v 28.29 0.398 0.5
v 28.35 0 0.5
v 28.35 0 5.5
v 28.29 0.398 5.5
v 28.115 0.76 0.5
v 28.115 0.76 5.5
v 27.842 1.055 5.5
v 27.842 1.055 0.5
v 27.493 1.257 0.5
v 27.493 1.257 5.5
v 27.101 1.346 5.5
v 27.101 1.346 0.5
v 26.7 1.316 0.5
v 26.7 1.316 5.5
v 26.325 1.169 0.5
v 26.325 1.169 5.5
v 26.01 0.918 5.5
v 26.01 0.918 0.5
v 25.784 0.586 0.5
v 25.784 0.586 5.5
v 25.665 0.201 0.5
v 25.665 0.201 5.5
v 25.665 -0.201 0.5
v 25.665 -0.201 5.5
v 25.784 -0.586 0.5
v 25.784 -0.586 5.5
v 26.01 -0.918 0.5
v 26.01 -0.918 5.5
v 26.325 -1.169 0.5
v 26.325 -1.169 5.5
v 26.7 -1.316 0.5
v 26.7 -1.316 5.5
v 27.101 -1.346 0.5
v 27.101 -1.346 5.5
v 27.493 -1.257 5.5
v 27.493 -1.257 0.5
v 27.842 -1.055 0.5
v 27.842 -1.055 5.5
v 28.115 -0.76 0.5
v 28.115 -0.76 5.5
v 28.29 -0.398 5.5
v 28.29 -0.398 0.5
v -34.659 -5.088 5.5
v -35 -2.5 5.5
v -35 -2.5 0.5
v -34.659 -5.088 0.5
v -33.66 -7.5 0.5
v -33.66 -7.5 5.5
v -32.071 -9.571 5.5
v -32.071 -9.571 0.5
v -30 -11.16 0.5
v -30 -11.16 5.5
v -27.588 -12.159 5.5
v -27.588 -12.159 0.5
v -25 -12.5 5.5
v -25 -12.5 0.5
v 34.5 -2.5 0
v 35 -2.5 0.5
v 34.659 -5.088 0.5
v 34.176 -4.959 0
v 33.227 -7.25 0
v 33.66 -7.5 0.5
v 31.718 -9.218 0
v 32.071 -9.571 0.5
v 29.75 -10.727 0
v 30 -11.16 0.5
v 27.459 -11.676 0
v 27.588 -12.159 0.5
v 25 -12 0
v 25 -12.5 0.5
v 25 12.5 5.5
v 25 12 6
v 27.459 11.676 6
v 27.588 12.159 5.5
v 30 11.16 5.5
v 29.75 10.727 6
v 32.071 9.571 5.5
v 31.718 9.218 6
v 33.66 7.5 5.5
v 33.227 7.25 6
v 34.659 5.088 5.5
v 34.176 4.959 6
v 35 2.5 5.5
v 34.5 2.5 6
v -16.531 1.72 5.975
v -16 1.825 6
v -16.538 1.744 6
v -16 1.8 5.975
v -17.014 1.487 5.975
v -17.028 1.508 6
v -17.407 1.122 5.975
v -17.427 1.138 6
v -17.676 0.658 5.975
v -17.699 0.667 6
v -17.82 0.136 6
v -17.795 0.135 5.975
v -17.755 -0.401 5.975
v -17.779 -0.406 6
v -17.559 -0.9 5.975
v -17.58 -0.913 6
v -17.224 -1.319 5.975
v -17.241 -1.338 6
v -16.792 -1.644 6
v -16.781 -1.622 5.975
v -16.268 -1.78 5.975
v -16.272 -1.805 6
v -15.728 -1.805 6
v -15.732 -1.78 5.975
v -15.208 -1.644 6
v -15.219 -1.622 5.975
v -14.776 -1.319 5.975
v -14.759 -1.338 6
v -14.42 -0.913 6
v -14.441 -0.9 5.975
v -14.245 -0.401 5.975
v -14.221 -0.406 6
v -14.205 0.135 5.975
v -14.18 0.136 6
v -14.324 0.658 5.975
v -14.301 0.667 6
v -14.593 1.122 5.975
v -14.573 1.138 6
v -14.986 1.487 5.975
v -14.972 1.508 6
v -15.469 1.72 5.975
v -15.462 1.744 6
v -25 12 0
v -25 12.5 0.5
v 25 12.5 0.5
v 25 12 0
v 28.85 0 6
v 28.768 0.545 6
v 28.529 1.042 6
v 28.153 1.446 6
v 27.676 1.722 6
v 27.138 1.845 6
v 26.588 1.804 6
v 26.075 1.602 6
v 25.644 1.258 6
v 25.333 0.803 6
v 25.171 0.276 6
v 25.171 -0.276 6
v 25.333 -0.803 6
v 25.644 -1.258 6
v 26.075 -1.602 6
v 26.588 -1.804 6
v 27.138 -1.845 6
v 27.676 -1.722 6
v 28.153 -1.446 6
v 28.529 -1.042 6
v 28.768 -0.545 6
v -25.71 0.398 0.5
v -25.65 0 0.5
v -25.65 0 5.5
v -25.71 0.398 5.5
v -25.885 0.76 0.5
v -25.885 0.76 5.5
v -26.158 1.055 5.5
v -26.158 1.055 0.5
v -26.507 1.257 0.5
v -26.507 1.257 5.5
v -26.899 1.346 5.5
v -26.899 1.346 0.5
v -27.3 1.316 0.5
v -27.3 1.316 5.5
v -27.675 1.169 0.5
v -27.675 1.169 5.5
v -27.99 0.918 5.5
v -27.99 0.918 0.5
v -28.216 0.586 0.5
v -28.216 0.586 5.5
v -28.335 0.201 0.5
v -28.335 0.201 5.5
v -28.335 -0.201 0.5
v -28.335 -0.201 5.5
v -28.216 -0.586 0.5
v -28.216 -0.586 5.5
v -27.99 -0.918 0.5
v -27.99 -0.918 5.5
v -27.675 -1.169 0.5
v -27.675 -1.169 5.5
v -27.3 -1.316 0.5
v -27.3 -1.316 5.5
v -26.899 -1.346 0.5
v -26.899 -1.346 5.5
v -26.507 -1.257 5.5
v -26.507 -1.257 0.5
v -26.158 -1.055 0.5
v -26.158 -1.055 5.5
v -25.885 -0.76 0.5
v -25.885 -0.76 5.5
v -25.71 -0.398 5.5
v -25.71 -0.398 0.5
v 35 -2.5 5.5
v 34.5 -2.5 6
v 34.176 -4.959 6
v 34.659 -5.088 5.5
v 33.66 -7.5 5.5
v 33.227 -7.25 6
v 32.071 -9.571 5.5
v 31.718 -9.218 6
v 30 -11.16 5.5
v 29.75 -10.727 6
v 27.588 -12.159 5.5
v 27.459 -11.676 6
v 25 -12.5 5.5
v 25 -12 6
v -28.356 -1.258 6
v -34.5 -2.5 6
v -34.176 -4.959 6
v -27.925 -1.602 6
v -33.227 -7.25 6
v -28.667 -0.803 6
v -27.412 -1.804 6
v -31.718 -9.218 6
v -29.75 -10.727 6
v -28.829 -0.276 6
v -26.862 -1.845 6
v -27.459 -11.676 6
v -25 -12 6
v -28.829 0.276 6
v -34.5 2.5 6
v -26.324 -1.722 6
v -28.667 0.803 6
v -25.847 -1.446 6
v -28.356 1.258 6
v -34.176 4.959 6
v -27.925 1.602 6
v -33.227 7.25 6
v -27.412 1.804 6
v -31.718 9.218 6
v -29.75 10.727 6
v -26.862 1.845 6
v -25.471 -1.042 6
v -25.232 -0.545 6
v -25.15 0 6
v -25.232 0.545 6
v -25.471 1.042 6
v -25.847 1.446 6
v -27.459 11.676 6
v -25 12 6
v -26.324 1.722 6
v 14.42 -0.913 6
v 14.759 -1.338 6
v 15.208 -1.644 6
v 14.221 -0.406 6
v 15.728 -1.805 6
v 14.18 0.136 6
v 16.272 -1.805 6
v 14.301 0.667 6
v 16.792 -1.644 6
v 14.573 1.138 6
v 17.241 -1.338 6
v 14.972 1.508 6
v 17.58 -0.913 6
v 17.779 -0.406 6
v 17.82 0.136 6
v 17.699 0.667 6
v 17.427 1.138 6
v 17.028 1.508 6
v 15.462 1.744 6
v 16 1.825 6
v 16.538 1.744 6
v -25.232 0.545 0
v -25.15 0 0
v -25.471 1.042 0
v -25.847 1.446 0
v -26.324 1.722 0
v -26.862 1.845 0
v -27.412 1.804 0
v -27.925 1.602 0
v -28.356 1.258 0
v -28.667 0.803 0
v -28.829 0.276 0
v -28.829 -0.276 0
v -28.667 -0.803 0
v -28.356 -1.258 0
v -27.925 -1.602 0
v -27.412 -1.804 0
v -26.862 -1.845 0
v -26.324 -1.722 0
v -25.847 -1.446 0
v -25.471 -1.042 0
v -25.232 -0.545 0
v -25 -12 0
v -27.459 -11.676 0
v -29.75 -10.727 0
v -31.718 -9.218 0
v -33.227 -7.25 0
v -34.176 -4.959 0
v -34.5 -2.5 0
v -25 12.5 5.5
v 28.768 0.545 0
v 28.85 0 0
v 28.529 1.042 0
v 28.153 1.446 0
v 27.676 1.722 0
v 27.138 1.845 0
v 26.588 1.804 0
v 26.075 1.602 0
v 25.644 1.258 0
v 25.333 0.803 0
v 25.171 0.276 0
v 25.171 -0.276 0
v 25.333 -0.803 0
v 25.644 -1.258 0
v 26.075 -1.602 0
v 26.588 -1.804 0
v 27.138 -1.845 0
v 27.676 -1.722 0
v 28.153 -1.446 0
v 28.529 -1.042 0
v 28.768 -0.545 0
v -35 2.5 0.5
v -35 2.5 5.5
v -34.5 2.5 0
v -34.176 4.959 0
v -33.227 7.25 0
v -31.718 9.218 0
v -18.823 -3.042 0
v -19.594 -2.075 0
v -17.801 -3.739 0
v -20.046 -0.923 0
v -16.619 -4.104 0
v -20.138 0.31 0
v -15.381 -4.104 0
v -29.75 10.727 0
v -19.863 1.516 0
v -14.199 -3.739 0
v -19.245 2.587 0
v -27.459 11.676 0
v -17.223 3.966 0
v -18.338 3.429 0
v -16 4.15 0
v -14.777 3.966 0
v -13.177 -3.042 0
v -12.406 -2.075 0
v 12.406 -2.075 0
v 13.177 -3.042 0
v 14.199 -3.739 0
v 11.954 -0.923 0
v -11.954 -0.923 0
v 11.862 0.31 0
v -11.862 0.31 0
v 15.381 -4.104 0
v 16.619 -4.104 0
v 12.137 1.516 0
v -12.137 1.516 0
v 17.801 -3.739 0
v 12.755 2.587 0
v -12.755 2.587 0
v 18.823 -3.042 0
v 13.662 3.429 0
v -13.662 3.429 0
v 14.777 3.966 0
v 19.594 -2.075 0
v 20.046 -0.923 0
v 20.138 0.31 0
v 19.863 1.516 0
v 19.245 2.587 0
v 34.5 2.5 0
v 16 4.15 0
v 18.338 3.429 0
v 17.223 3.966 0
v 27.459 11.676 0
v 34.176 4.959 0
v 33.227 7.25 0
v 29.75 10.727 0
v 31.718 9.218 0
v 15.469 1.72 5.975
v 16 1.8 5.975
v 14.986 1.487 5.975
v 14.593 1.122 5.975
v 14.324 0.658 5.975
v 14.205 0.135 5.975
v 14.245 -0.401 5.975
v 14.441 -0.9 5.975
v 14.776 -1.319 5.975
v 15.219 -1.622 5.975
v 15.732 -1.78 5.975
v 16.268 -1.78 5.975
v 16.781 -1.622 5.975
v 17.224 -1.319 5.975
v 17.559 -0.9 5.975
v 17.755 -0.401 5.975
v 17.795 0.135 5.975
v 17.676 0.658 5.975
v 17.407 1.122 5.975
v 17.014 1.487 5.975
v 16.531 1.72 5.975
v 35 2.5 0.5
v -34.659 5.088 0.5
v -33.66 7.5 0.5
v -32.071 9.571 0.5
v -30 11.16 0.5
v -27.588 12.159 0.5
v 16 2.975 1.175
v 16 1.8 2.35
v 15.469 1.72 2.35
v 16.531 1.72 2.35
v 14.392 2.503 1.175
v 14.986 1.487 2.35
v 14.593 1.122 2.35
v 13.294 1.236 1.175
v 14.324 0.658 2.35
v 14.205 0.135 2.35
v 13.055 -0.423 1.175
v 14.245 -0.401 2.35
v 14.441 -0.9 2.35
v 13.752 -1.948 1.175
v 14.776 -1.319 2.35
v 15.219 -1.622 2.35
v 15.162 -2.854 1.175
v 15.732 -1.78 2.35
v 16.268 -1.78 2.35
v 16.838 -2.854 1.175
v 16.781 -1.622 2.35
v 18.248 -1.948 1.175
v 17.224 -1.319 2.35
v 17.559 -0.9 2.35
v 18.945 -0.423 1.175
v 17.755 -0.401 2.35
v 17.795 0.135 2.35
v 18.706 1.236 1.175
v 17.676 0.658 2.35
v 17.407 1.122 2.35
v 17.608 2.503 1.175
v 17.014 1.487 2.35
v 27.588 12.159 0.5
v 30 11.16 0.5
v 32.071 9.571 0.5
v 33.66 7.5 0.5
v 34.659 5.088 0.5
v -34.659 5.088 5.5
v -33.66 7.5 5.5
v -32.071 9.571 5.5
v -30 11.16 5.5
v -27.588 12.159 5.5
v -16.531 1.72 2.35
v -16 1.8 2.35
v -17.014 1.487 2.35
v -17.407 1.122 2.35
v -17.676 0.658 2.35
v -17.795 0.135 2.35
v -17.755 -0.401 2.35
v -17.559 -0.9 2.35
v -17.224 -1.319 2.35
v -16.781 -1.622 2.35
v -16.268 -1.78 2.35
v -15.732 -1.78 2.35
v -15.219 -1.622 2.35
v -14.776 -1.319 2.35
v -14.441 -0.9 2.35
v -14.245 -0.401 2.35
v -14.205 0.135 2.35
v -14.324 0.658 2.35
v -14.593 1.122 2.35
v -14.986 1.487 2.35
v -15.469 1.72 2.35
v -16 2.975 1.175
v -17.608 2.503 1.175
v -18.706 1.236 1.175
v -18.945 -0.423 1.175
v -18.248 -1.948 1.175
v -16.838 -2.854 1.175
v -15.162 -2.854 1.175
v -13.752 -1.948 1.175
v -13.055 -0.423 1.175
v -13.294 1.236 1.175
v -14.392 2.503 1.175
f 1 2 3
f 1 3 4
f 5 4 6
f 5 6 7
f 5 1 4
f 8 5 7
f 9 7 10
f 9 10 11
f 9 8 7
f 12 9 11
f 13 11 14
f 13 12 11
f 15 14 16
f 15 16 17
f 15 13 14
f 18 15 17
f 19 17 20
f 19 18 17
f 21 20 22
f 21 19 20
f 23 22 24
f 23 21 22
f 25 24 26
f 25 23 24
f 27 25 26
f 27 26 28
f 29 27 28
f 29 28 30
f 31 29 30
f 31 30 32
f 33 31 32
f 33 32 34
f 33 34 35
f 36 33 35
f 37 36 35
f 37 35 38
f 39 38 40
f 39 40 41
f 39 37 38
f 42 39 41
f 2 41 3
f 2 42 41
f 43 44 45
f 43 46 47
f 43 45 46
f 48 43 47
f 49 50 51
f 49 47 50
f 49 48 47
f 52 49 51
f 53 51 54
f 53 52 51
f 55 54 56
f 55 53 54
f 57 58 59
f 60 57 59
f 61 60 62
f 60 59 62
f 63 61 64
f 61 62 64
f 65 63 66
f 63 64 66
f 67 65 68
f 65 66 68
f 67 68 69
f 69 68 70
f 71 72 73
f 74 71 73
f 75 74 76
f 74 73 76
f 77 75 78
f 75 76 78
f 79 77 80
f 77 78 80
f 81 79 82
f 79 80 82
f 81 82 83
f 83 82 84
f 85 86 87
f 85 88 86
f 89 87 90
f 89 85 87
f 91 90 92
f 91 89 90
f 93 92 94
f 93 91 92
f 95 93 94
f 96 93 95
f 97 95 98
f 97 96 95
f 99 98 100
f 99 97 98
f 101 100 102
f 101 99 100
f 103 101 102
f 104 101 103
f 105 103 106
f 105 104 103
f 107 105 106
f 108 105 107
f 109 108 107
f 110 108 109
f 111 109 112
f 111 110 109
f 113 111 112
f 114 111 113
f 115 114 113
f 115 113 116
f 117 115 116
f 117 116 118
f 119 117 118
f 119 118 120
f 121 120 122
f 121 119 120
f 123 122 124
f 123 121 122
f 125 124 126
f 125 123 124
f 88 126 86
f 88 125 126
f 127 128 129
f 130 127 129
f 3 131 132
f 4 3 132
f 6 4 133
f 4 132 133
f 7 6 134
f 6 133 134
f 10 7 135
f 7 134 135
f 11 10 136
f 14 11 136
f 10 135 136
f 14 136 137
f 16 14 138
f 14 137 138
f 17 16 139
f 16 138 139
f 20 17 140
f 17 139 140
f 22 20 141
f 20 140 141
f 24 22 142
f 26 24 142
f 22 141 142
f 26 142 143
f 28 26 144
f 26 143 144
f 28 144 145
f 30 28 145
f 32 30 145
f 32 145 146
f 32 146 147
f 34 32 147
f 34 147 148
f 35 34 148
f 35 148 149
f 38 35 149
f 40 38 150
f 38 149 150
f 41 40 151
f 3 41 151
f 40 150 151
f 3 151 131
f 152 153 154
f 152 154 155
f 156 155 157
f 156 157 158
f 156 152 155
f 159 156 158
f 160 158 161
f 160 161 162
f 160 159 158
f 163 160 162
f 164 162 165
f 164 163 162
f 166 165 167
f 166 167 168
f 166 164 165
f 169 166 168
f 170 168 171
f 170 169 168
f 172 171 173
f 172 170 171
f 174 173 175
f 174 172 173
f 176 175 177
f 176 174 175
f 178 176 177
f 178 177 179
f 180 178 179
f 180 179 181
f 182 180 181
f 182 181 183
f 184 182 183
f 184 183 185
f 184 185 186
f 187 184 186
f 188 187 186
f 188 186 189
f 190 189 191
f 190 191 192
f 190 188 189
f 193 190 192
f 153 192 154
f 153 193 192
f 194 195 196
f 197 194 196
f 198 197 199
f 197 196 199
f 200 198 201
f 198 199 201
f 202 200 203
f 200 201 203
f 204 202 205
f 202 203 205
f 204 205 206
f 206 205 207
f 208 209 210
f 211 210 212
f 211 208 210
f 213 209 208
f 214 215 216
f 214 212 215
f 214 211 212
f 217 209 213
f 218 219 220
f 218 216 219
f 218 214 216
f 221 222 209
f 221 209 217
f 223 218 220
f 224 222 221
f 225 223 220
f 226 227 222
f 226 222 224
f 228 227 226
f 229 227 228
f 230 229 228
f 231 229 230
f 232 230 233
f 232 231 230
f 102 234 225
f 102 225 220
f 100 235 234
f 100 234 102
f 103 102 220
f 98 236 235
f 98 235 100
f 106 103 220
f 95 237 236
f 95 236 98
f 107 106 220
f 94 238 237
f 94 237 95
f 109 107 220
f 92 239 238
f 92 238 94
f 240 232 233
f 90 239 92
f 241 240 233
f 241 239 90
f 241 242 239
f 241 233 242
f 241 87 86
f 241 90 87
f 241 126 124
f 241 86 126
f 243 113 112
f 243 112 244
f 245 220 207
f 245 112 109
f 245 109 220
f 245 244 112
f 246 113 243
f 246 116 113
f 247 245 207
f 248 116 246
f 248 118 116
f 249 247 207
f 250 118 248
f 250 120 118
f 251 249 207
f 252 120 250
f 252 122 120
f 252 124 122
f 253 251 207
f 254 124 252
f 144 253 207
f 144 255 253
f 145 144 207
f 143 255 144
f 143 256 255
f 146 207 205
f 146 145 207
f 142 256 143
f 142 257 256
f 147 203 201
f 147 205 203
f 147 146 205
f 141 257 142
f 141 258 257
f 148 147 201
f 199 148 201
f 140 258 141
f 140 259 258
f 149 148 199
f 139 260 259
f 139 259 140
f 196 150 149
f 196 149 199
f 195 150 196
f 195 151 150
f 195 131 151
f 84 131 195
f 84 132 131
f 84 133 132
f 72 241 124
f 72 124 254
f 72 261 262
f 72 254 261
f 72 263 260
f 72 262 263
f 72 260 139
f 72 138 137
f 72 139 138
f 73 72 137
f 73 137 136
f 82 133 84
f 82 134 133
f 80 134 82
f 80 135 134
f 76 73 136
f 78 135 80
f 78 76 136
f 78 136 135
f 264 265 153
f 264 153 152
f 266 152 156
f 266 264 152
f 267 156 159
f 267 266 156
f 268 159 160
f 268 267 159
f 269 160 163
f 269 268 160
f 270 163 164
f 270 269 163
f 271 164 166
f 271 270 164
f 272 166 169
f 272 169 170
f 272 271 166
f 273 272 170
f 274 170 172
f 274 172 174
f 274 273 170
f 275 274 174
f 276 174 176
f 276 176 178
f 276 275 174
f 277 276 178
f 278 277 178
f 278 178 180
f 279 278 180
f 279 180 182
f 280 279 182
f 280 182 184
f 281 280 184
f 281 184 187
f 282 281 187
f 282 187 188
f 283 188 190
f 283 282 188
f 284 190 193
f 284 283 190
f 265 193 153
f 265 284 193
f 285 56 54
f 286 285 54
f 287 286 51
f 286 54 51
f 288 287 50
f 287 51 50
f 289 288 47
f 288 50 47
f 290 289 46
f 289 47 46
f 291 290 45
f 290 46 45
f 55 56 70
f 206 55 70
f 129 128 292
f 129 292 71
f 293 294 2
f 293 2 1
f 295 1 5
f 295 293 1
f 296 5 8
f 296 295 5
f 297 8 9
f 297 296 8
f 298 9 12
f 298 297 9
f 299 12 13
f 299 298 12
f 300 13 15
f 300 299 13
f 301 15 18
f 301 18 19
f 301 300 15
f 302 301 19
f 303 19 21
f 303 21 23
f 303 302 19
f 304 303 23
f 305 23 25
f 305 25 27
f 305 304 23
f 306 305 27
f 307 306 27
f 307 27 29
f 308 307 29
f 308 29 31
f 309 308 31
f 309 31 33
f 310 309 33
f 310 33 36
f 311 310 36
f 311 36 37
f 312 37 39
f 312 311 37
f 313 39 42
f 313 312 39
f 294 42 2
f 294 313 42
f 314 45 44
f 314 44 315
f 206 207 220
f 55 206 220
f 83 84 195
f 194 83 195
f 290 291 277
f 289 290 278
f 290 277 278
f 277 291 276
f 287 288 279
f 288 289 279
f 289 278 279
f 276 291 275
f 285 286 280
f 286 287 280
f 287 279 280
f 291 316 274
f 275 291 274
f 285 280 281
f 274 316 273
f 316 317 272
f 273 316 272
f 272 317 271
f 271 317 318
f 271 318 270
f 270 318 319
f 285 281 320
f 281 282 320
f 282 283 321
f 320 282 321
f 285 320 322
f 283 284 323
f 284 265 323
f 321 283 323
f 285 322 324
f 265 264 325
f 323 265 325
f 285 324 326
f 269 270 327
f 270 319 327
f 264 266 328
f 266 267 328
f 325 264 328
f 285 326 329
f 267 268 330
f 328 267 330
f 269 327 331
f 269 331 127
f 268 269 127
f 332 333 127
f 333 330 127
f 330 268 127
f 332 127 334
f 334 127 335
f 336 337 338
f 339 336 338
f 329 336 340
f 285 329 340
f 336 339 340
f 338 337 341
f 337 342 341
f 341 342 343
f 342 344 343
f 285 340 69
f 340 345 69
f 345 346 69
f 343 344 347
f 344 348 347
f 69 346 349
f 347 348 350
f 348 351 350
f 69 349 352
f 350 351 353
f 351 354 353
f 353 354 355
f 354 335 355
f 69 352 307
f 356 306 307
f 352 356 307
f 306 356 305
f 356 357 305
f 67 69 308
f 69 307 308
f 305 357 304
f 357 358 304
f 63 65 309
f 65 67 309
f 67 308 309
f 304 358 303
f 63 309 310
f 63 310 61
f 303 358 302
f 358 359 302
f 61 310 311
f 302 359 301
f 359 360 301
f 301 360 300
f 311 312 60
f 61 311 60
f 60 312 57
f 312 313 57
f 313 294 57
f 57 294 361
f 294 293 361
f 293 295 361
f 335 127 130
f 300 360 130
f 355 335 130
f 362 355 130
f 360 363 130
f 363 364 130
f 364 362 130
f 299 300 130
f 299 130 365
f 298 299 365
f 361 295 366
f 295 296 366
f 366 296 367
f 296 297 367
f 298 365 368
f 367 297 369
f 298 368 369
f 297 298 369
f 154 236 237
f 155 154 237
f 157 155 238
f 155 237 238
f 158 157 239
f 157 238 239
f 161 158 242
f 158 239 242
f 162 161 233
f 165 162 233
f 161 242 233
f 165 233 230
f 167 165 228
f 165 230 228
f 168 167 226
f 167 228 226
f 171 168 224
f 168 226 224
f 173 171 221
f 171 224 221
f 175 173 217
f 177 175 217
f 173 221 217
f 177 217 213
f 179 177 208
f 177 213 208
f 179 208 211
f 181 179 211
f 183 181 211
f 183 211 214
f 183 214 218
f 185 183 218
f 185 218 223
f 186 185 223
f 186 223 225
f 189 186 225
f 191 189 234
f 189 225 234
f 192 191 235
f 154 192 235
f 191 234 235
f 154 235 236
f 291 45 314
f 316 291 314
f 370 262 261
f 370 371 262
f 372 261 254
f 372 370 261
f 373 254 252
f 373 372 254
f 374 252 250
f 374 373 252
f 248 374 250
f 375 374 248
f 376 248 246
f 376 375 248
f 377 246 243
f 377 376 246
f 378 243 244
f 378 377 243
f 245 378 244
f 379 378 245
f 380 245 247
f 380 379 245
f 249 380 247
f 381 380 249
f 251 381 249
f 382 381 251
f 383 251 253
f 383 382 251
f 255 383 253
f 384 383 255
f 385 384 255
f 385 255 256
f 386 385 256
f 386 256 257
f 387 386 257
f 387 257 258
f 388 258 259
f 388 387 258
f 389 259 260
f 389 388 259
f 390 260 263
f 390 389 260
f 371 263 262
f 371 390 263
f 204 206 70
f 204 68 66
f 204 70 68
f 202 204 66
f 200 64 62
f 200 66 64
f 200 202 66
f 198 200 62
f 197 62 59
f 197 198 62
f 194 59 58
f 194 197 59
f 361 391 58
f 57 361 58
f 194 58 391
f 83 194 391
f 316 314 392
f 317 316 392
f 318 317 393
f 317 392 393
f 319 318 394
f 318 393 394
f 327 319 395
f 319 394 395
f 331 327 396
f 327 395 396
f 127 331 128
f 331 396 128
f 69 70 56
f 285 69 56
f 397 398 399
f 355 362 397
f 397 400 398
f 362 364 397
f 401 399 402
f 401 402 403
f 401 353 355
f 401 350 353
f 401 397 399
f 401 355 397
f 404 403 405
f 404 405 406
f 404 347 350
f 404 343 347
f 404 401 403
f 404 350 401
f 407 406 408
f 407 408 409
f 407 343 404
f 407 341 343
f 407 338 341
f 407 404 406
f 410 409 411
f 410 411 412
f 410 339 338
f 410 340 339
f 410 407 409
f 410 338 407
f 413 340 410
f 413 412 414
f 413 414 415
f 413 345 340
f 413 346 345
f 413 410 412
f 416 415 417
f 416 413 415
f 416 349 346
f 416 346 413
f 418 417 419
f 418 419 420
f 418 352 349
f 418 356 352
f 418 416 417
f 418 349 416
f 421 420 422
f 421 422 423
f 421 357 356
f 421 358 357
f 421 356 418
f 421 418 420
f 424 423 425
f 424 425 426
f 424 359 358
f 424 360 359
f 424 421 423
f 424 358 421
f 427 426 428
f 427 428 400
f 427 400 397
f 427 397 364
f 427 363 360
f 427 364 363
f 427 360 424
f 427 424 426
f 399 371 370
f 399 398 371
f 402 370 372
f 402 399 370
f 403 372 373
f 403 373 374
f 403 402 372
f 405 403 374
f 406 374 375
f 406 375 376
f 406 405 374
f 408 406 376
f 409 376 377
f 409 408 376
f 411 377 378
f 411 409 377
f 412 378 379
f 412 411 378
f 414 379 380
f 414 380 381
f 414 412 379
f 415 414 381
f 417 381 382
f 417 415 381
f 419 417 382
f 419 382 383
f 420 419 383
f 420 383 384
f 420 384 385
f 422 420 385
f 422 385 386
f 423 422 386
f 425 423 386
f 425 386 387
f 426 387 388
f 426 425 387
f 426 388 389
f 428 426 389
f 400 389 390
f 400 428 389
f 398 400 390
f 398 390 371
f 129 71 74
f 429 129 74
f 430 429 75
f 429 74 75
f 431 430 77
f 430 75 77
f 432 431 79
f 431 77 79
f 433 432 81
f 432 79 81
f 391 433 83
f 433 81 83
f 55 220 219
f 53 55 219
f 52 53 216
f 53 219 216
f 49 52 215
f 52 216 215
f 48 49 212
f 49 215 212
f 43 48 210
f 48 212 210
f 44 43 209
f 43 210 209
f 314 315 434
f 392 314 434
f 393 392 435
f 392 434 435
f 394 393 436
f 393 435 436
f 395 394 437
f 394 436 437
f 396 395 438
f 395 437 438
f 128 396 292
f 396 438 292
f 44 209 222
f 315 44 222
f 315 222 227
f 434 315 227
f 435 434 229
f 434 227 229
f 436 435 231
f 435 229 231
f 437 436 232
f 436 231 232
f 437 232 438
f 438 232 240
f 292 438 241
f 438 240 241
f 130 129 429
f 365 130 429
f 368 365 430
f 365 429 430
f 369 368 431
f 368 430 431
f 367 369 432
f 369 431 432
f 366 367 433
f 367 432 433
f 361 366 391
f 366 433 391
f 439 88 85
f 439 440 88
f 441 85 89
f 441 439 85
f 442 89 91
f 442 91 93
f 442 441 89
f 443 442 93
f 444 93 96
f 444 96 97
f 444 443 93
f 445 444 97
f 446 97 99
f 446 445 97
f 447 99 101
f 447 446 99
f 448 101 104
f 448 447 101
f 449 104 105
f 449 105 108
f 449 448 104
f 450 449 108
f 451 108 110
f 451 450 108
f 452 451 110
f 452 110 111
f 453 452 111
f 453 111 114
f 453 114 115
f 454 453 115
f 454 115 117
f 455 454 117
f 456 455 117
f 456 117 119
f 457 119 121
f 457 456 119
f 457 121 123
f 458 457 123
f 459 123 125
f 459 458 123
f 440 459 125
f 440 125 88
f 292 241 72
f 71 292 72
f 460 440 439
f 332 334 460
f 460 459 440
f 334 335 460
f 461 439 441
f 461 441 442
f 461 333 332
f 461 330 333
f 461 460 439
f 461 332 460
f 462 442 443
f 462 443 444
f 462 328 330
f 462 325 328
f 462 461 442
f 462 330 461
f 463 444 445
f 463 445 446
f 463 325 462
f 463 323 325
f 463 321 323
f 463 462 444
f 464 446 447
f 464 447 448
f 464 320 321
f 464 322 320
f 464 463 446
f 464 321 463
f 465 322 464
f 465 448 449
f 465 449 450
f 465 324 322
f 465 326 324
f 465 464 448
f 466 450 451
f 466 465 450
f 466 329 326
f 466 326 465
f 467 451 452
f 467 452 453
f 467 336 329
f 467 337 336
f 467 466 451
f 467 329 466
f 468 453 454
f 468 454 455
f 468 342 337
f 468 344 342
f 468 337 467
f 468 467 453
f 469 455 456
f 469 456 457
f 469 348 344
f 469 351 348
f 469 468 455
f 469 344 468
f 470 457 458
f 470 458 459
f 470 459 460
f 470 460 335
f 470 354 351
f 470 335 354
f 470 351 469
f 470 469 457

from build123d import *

# Parameters (mm, degrees)
SKETCH1_W                                    = 70
SKETCH1_H                                    = 25
SKETCH1_R                                    = 1.35
BOSS_EXTRUDE1_DEPTH                          = 6
CHAMFER1_SIZE                                = 0.5
FILLET1_R                                    = 10
CHAMFER2_SIZE                                = 0.5
CSK_FOR_M3_COUNTERSUNK_FLAT_HEAD_SCR_2_COUNT = 2
CSK_FOR_M3_COUNTERSUNK_FLAT_HEAD_SCR_2_PITCH = 32


with BuildPart() as part:
    # Sketch1 → Boss-Extrude1 (new body)
    with BuildSketch(Plane.XY):
        Rectangle(SKETCH1_W, SKETCH1_H)
        with Locations((-27, 0)):
            Circle(SKETCH1_R, mode=Mode.SUBTRACT)
        with Locations((27, 0)):
            Circle(SKETCH1_R, mode=Mode.SUBTRACT)
        with Locations((-16, 0)):
            Circle(SKETCH1_R, mode=Mode.SUBTRACT)
        with Locations((16, 0)):
            Circle(SKETCH1_R, mode=Mode.SUBTRACT)
    extrude(amount=BOSS_EXTRUDE1_DEPTH)

    # Chamfer1
    chamfer1_edges = [part.edges().sort_by_distance(p)[0] for p in [
        (-28.35, 0, 0),
        (-28.35, 0, 6),
        (25.65, 0, 0),
        (25.65, 0, 6),
    ]]
    chamfer(chamfer1_edges, length=CHAMFER1_SIZE)

    # Fillet1
    fillet1_edges = [part.edges().sort_by_distance(p)[0] for p in [
        (35, -12.5, 3),
        (-35, -12.5, 3),
        (-35, 12.5, 3),
        (35, 12.5, 3),
    ]]
    fillet(fillet1_edges, radius=FILLET1_R)

    # Chamfer2
    chamfer2_edges = [part.edges().sort_by_distance(p)[0] for p in [
        (-35, 0, 0),
        (-35, 0, 6),
        (35, 0, 0),
        (0, -12.5, 0),
        (0, 12.5, 0),
        (32.071067812, -9.571067812, 0),
        (-32.071067812, -9.571067812, 0),
        (32.071067812, 9.571067812, 0),
        (-32.071067812, 9.571067812, 0),
        (0, 12.5, 6),
        (35, 0, 6),
        (0, -12.5, 6),
        (32.071067812, -9.571067812, 6),
        (-32.071067812, -9.571067812, 6),
        (32.071067812, 9.571067812, 6),
        (-32.071067812, 9.571067812, 6),
    ]]
    chamfer(chamfer2_edges, length=CHAMFER2_SIZE)

    # Sketch3 → CSK for M3 Countersunk Flat Head Screw1 (revolve, cut)
    with BuildSketch(Plane.YZ.offset(-16)):
        Polygon((0, 0), (0, 6), (1.825, 6), (1.8, 5.975), (1.8, 2.35), (4.15, 0), align=None)
    csk_for_m3_countersunk_flat_head_screw1 = revolve(axis=Axis((-16, 0, -6.35), (0, 0, 1)), mode=Mode.SUBTRACT)

    # CSK for M3 Countersunk Flat Head Scr 2: CSK for M3 Countersunk Flat Head Screw1 ×2
    with Locations(*[(i * CSK_FOR_M3_COUNTERSUNK_FLAT_HEAD_SCR_2_PITCH, 0, 0) for i in range(1, CSK_FOR_M3_COUNTERSUNK_FLAT_HEAD_SCR_2_COUNT)]):
        add(csk_for_m3_countersunk_flat_head_screw1, mode=Mode.SUBTRACT)


solid = part.part
